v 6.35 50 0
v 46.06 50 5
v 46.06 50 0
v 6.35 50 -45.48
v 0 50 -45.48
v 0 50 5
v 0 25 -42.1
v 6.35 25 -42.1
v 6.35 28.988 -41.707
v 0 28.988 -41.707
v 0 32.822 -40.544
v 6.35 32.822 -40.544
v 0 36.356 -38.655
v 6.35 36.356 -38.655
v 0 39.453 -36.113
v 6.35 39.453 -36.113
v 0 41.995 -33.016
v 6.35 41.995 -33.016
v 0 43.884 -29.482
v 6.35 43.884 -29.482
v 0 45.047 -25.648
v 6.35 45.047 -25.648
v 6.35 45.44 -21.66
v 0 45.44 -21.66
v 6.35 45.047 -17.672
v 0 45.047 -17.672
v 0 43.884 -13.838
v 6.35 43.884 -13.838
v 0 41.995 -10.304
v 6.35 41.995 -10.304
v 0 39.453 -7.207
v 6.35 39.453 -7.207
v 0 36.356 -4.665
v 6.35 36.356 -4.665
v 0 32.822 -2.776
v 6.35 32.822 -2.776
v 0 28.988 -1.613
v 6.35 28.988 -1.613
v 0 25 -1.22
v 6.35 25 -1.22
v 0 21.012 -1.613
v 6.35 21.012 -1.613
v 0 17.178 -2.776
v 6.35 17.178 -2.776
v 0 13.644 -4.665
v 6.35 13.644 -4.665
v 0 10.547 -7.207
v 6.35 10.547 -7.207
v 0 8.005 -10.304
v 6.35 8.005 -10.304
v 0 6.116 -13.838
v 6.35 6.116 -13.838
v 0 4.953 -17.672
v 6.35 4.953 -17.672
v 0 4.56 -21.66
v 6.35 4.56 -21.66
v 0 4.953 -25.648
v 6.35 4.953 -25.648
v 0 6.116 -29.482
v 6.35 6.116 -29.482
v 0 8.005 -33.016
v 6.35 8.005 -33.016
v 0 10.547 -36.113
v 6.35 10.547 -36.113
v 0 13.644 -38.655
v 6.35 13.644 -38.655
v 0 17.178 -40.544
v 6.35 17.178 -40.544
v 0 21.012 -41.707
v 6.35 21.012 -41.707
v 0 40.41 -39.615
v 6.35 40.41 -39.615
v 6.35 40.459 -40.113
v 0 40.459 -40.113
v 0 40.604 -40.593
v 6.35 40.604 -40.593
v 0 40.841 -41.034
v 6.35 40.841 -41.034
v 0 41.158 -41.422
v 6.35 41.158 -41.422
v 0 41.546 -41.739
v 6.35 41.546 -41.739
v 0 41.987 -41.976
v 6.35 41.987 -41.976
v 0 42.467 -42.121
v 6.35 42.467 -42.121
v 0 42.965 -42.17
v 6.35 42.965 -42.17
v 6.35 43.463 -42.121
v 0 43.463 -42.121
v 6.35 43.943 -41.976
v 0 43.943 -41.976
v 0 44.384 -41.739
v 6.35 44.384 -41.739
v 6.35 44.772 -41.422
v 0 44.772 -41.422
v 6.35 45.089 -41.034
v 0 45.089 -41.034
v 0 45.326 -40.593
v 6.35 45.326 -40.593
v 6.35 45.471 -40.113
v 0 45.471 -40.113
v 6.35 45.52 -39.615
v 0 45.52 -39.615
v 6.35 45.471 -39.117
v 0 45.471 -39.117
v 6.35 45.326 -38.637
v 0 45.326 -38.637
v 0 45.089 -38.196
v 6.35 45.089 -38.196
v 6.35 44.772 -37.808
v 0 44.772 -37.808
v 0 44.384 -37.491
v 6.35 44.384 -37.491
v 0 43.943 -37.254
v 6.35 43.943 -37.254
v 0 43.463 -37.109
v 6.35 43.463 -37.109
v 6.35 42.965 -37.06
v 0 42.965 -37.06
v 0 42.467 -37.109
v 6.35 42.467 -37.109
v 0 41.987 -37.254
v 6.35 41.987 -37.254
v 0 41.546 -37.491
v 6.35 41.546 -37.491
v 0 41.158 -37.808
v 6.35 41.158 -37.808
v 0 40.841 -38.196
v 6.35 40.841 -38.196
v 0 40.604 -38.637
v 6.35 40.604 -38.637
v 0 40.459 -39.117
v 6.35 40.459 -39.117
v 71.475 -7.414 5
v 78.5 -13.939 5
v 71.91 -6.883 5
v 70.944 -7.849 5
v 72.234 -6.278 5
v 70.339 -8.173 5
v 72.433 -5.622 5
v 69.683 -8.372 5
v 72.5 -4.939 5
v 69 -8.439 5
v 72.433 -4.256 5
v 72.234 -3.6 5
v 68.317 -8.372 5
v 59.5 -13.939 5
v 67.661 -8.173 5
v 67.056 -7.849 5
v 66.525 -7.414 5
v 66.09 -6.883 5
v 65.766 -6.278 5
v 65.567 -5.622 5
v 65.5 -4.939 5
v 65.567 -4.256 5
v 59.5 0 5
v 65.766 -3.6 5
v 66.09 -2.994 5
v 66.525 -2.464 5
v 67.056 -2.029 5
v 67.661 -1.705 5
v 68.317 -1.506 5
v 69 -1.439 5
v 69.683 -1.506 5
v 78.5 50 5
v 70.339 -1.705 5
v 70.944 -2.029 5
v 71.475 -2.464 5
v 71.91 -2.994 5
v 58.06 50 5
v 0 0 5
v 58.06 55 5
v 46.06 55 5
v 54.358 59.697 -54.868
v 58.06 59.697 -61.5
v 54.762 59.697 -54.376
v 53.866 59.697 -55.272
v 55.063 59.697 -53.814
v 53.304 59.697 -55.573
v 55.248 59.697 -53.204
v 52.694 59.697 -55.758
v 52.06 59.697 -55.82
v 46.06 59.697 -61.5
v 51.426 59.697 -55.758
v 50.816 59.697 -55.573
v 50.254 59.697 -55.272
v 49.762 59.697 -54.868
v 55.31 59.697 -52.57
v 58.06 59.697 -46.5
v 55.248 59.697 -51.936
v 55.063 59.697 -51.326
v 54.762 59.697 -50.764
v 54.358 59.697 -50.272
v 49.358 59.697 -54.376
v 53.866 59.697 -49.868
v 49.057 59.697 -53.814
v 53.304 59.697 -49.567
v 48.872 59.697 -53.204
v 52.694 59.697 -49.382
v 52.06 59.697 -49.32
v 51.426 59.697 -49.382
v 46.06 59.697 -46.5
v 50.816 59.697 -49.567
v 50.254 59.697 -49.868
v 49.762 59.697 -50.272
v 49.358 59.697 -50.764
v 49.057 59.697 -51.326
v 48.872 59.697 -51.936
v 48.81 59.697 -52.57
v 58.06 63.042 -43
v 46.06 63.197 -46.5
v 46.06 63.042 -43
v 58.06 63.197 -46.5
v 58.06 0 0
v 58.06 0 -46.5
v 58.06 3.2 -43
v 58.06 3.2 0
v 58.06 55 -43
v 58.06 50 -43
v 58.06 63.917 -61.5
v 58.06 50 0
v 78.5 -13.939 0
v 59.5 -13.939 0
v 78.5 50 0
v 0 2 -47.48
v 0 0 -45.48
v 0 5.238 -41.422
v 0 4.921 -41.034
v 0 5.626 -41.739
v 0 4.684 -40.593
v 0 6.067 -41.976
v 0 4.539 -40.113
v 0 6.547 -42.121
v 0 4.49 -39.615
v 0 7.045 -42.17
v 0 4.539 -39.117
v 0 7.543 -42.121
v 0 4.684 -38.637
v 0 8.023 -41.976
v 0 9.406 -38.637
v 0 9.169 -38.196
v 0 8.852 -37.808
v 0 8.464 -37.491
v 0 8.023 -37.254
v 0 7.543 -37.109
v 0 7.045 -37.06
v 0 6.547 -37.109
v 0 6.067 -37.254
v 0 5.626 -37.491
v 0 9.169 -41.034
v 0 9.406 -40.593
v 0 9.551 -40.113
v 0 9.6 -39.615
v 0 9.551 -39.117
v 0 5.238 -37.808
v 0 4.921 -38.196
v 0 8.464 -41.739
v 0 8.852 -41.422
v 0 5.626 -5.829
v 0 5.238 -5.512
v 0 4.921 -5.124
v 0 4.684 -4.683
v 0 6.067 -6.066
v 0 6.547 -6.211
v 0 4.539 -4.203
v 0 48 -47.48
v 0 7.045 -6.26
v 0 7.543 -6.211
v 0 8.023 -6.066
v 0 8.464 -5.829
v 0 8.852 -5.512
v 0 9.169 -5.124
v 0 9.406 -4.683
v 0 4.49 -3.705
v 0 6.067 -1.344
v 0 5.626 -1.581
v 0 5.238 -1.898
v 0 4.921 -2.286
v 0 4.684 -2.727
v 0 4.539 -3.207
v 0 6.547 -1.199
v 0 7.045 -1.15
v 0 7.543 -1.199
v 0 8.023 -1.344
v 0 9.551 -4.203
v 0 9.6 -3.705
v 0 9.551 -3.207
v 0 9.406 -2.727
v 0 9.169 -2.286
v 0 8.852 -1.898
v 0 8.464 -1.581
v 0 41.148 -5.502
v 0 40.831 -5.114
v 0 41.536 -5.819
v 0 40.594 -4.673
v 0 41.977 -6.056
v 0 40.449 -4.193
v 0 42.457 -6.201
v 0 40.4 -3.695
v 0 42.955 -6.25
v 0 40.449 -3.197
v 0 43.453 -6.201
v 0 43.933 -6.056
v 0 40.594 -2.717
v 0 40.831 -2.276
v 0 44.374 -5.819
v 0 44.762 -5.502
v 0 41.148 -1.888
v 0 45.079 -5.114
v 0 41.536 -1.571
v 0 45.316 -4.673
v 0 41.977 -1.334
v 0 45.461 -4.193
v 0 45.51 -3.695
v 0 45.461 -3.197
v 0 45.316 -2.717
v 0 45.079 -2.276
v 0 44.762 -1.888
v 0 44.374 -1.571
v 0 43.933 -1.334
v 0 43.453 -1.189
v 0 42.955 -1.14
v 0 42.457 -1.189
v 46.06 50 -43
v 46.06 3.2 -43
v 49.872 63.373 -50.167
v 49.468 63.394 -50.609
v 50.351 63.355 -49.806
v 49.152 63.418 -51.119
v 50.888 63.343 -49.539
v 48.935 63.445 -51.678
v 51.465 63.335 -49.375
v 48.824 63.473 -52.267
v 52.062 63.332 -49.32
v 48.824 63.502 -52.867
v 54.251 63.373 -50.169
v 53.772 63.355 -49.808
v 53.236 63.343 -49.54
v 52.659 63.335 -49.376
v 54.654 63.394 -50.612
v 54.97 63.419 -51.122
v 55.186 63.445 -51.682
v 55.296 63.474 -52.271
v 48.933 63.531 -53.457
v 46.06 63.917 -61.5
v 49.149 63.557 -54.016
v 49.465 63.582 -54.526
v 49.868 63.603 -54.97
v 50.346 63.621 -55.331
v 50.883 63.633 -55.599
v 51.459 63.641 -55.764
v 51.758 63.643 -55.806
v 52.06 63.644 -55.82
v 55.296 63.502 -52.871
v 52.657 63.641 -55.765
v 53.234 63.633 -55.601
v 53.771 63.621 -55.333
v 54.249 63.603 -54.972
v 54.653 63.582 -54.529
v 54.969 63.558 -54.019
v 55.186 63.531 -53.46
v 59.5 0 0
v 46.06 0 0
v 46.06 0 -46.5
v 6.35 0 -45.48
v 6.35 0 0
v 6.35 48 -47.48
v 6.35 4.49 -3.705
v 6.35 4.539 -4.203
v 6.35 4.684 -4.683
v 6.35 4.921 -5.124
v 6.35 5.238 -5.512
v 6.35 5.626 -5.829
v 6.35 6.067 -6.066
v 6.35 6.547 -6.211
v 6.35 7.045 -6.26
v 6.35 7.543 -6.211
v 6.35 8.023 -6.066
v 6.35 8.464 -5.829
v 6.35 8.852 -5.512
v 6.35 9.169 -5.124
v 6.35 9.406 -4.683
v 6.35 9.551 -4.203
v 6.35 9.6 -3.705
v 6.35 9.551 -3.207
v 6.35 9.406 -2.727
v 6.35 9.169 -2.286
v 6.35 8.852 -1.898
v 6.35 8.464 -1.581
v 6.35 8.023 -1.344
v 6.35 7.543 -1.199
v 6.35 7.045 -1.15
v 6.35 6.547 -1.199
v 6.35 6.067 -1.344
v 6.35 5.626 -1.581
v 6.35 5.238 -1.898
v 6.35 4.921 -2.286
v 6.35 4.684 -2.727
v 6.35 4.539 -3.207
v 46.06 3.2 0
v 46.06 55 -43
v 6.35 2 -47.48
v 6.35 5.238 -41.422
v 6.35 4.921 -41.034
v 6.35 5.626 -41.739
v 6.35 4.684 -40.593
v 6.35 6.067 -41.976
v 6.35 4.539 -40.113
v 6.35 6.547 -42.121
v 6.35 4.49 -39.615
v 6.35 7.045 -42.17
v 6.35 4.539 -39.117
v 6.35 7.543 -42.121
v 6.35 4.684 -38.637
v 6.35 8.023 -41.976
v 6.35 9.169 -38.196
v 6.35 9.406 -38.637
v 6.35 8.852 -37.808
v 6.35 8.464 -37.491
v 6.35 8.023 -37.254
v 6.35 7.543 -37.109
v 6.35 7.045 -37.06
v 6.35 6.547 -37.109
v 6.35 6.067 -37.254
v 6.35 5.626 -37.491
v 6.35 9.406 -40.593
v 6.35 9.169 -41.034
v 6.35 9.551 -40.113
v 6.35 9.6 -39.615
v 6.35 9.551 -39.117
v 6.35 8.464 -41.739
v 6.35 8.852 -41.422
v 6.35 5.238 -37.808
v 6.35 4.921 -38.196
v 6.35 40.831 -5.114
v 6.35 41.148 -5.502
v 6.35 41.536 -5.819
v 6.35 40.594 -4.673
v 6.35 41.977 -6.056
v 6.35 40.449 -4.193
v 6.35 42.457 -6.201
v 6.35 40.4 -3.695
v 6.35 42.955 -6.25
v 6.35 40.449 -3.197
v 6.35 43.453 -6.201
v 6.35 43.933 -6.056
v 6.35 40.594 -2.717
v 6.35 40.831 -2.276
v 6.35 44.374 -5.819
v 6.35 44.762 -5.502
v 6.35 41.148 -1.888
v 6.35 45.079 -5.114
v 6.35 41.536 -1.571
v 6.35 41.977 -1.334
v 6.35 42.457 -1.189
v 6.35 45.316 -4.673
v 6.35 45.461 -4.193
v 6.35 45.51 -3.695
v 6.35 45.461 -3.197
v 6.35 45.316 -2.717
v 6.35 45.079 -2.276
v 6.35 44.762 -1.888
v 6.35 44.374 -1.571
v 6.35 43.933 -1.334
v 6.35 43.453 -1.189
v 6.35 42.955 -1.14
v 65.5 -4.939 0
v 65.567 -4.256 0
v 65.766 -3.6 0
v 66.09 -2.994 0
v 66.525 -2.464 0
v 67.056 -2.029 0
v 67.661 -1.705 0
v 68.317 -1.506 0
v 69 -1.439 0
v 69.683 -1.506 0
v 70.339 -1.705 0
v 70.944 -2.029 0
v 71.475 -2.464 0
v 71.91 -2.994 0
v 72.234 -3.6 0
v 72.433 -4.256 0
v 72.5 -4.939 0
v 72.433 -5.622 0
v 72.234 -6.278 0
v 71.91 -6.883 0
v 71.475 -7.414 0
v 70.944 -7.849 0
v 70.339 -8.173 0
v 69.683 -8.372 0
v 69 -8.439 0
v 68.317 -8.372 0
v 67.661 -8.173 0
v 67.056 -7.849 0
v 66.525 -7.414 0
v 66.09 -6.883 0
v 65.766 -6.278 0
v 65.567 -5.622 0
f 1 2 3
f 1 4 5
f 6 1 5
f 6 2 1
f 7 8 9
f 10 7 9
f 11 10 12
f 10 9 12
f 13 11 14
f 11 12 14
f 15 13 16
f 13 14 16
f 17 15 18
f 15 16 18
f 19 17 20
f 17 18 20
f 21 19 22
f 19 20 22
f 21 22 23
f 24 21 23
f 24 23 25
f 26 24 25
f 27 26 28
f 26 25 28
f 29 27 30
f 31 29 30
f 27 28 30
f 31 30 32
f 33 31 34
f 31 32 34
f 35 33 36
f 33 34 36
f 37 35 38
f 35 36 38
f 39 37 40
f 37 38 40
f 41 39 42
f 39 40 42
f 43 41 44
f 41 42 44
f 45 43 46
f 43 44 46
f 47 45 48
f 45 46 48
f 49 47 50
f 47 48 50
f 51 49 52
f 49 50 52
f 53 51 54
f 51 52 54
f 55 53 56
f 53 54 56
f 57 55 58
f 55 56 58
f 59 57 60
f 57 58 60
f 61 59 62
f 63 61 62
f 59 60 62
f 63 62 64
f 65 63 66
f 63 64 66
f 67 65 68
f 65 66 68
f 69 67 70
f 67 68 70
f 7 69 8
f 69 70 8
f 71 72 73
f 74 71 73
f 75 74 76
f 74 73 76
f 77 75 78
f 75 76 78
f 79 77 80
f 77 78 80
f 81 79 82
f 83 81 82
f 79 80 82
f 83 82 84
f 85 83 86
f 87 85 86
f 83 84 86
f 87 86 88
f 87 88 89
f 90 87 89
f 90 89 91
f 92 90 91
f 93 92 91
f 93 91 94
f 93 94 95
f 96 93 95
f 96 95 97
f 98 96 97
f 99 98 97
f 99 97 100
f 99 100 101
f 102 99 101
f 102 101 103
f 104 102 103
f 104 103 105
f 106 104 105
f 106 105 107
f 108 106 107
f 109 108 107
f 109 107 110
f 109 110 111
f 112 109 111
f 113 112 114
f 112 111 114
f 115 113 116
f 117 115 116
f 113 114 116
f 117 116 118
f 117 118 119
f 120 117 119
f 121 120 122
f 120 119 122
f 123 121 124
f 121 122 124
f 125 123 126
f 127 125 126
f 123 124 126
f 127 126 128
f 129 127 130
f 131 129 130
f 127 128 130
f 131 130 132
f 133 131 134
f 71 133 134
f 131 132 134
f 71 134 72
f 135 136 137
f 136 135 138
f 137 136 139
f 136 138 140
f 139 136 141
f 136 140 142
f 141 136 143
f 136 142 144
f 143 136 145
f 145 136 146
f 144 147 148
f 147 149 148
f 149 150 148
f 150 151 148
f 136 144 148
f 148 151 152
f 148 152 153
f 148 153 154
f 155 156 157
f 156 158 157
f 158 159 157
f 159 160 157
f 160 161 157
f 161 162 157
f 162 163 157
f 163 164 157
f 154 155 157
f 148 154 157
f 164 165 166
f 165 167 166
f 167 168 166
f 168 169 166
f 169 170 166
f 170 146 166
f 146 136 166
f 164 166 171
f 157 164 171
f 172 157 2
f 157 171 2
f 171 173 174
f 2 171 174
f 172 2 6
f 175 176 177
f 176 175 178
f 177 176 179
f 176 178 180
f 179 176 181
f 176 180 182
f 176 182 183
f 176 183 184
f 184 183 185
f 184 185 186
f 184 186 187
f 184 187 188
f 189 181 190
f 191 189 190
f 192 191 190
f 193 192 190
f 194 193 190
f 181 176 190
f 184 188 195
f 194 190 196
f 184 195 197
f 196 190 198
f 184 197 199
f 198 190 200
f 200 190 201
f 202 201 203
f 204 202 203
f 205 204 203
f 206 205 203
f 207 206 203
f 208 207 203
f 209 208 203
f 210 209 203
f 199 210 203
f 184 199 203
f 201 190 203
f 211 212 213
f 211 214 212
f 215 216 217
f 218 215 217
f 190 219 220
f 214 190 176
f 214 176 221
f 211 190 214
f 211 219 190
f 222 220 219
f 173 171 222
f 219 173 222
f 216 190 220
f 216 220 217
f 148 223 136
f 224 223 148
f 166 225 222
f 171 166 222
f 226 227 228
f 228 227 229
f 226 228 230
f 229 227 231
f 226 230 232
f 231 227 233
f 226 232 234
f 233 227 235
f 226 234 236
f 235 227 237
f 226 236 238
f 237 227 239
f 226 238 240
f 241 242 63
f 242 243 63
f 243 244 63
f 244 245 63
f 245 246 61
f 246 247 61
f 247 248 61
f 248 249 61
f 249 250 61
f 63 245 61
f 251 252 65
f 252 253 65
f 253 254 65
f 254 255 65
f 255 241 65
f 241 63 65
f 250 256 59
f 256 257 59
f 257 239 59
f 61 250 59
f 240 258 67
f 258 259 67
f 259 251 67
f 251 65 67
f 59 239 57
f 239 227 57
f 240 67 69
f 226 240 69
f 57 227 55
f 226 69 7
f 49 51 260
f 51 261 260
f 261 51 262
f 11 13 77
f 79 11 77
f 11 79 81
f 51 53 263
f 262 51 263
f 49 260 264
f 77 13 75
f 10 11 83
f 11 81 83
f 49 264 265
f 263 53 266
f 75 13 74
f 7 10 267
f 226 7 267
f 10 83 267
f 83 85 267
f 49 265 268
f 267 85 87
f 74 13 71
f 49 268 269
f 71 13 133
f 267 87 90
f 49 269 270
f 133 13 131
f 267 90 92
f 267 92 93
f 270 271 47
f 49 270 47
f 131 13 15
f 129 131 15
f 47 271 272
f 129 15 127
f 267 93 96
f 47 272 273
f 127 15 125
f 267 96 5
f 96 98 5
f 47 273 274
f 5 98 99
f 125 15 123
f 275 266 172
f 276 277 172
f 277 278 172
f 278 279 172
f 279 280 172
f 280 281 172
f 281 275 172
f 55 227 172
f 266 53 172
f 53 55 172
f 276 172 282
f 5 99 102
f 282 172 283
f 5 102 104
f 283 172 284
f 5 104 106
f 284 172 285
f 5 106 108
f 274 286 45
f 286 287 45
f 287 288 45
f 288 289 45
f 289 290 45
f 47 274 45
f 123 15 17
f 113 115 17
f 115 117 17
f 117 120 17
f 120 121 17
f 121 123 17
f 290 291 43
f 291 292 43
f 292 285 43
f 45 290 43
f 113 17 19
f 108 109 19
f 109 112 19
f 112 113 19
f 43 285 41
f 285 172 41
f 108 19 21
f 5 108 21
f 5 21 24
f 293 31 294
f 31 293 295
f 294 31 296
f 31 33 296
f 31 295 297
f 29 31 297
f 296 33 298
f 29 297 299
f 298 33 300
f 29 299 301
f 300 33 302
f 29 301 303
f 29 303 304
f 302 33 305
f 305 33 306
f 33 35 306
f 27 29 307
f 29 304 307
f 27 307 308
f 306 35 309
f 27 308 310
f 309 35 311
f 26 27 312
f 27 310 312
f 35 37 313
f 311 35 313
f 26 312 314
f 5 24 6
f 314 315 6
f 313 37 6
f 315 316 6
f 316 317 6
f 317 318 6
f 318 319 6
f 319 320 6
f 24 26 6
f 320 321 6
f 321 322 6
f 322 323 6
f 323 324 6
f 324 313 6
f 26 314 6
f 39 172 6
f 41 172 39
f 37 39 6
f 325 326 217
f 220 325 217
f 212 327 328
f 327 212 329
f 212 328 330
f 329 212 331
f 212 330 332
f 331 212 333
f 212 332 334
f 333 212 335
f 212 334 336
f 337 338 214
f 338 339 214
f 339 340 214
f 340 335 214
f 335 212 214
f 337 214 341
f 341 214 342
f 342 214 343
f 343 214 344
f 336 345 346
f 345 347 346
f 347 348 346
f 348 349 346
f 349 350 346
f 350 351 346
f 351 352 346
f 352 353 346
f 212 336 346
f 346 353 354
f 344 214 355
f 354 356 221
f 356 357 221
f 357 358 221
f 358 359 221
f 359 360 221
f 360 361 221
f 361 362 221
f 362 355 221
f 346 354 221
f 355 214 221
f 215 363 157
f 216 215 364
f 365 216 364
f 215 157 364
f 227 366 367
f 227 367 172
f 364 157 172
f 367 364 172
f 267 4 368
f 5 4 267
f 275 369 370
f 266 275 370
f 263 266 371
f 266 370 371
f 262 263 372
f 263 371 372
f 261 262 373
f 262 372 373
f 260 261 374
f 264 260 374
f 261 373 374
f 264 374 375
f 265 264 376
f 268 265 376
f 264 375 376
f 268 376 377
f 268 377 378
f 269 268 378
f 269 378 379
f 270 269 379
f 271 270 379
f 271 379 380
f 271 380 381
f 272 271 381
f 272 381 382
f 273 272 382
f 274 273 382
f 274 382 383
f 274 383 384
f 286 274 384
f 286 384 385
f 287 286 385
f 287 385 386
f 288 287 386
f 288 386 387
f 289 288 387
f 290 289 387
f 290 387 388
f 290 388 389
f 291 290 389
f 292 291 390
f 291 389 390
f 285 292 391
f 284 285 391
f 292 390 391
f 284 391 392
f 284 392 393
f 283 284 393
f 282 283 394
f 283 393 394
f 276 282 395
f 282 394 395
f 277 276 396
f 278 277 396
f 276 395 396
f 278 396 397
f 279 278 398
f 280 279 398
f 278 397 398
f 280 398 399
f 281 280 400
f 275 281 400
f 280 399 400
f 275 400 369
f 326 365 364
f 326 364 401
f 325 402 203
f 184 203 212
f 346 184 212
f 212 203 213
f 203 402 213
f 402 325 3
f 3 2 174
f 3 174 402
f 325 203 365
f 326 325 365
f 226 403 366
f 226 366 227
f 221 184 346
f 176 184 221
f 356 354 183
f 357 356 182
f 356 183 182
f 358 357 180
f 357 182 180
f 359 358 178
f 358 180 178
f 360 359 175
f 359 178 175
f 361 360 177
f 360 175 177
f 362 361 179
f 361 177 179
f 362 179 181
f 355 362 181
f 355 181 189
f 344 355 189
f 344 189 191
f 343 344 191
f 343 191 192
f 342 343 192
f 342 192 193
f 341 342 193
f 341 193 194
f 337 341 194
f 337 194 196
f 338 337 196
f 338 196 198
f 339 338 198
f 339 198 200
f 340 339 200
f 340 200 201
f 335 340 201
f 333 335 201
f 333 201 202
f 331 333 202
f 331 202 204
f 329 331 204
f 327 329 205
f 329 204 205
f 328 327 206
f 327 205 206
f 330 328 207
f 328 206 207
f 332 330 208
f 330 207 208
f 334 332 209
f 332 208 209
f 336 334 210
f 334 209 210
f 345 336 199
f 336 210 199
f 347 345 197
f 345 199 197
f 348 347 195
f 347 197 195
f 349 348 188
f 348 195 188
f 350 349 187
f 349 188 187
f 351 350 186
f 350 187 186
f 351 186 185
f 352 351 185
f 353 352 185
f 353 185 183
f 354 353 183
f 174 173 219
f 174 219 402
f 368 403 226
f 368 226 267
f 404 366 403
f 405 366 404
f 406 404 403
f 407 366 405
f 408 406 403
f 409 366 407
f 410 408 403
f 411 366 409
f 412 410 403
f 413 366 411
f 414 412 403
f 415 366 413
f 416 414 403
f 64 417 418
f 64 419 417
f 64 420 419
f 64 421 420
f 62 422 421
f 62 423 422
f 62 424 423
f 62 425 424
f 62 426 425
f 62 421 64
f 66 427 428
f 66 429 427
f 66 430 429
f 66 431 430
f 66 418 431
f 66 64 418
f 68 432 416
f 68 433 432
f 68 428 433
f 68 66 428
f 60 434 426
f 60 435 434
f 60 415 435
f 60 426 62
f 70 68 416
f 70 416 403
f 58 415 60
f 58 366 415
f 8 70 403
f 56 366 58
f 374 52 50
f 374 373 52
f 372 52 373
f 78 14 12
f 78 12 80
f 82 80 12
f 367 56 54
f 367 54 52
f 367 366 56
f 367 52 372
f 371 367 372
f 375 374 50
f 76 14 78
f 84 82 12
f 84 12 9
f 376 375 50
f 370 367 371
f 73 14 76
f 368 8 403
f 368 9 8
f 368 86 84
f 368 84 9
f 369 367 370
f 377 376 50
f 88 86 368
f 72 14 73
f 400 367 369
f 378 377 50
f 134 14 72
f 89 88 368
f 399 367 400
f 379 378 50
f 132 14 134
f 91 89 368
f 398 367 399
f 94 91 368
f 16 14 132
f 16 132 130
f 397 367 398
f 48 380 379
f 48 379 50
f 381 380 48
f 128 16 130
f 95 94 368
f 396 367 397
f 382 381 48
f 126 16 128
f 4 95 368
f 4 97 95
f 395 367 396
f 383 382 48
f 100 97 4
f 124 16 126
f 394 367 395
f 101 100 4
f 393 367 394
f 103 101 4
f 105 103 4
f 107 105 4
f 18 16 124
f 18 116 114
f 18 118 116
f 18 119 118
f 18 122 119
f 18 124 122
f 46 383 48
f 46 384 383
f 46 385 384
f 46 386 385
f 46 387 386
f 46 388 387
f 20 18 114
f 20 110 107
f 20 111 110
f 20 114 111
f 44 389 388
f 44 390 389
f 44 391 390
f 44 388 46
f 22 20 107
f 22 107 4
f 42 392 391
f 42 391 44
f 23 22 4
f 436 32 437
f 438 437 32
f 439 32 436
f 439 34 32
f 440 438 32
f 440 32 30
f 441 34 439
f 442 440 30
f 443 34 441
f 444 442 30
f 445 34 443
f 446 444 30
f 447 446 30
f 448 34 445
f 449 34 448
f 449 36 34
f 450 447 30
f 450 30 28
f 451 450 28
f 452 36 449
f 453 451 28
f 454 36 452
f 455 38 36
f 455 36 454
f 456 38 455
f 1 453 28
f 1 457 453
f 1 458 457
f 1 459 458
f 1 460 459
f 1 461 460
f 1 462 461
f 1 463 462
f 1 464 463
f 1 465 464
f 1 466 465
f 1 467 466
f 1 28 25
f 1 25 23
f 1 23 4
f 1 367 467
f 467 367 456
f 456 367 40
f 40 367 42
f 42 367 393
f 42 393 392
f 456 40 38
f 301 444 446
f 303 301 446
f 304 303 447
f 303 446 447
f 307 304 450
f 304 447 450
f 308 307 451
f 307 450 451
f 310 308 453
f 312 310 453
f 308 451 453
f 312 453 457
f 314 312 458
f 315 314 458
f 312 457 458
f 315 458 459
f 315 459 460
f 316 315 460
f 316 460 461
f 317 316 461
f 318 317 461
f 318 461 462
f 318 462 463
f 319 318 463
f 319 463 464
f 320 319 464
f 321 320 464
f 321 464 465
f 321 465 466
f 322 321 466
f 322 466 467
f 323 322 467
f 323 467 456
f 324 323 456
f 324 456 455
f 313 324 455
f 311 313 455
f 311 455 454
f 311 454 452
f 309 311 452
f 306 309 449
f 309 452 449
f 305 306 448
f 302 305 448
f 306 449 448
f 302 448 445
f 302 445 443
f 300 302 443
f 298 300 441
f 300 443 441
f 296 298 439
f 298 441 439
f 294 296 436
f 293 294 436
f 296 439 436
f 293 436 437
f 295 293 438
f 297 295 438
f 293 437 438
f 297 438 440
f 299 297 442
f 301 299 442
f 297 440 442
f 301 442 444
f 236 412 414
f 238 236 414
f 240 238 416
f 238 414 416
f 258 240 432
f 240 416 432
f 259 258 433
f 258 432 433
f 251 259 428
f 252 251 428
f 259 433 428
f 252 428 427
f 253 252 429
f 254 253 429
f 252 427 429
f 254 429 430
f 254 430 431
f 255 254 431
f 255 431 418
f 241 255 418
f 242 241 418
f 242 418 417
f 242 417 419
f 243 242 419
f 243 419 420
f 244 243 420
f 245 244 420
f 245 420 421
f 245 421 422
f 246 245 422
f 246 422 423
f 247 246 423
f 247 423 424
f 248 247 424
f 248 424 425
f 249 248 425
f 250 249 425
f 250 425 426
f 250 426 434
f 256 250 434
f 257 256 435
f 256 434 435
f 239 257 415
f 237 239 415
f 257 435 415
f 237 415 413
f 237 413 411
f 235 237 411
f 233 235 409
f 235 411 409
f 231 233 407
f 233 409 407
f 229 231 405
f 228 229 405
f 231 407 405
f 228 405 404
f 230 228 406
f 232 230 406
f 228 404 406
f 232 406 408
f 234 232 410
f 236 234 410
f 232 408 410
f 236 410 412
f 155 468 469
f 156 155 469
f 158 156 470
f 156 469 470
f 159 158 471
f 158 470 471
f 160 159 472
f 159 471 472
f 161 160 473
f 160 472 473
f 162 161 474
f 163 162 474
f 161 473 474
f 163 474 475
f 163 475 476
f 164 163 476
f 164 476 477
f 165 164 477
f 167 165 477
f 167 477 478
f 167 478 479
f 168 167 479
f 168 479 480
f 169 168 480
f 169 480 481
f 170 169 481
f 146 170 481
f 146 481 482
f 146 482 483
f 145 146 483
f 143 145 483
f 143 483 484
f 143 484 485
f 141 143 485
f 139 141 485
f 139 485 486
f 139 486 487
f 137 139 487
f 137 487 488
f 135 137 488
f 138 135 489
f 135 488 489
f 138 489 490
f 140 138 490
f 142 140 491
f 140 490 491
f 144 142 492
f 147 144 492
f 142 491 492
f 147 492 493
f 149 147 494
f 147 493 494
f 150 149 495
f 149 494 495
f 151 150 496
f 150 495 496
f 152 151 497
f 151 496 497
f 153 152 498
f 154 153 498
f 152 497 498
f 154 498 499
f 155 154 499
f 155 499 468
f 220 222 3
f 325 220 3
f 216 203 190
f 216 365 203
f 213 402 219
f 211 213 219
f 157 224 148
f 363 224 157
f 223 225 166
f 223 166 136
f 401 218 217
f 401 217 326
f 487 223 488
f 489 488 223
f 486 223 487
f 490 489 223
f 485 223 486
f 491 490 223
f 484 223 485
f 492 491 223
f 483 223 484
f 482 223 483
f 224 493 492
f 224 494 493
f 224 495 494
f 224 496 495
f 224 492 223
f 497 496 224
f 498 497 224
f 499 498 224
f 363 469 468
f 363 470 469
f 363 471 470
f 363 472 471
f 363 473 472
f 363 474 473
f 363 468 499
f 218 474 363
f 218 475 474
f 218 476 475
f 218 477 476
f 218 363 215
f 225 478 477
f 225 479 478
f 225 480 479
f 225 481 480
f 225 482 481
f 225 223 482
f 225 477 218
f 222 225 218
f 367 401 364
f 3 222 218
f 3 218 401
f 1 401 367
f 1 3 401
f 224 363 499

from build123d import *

# Parameters (mm, degrees)
BOSS_EXTRUDE1_DEPTH  = 5
SKETCH2_W            = 6.35
SKETCH2_H            = 50
BOSS_EXTRUDE2_DEPTH  = 52.48
CUT_EXTRUDE1_REACH   = 111.834
SKETCH3_R            = 20.44
SKETCH3_R_2          = 2.555
SKETCH3_W            = 5
SKETCH3_H            = 50
CUT_EXTRUDE2_REACH   = 113.895
SKETCH4_R            = 3.5
CUT_EXTRUDE6_REACH   = 113.895
SKETCH14_W           = 19
SKETCH14_H           = 15.316152196
SKETCH15_W           = 12
SKETCH15_H           = 3.2
BOSS_EXTRUDE7_DEPTH  = 46.5
BOSS_EXTRUDE8_REACH  = 107.356
SKETCH16_W           = 12
SKETCH16_H           = 3.5
SKETCH17_W           = 12
SKETCH17_H           = 3.5
BOSS_EXTRUDE9_DEPTH  = 15
CHAMFER2_SIZE        = 2
SKETCH22_W           = 12
SKETCH22_H           = 15
BOSS_EXTRUDE10_DEPTH = 0.72
CUT_EXTRUDE8_REACH   = 108.012
CUT_EXTRUDE7_REACH   = 125.963
SKETCH18_R           = 3.25
CIRPATTERN2_COUNT    = 2
CIRPATTERN2_ANGLE    = 90
BOSS_EXTRUDE11_REACH = 120.448
SKETCH24_W           = 12
SKETCH24_H           = 5


with BuildPart() as part:
    # Sketch1 → Boss-Extrude1 (new body)
    with BuildSketch(Plane.XY):
        Polygon((0, 0), (0, 50), (46.06, 50), (46.06, 55), (58.06, 55), (58.06, 50), (59.5, 50), (59.5, 64.061014889), (78.5, 64.061014889), (78.5, -13.938985111), (59.5, -13.938985111), (59.5, 0), align=None)
    extrude(amount=BOSS_EXTRUDE1_DEPTH)

    # Sketch2 → Boss-Extrude2 (add)
    with BuildSketch(Plane(origin=(0, 0, 0), x_dir=(-1, 0, 0), z_dir=(0, 0, -1))):
        with Locations((-3.175, 25)):
            Rectangle(SKETCH2_W, SKETCH2_H)
    extrude(amount=BOSS_EXTRUDE2_DEPTH)

    # Sketch3 → Cut-Extrude1 (cut, up to next)
    with BuildSketch(Plane(origin=(6.35, 0, 0), x_dir=(0, 0, -1), z_dir=(1, 0, 0)), mode=Mode.PRIVATE) as cut_extrude1_sk1:
        with Locations((21.66, 25)):
            Circle(SKETCH3_R)
    cut_extrude1_tool1 = extrude(cut_extrude1_sk1.sketch, amount=-CUT_EXTRUDE1_REACH, mode=Mode.PRIVATE) & part.part
    # Sketch3 → Cut-Extrude1 (cut, up to next)
    with BuildSketch(Plane(origin=(6.35, 0, 0), x_dir=(0, 0, -1), z_dir=(1, 0, 0)), mode=Mode.PRIVATE) as cut_extrude1_sk2:
        with Locations((3.695, 42.955)):
            Circle(SKETCH3_R_2)
    cut_extrude1_tool2 = extrude(cut_extrude1_sk2.sketch, amount=-CUT_EXTRUDE1_REACH, mode=Mode.PRIVATE) & part.part
    # Sketch3 → Cut-Extrude1 (cut, up to next)
    with BuildSketch(Plane(origin=(6.35, 0, 0), x_dir=(0, 0, -1), z_dir=(1, 0, 0)), mode=Mode.PRIVATE) as cut_extrude1_sk3:
        with Locations((39.615, 7.045)):
            Circle(SKETCH3_R_2)
    cut_extrude1_tool3 = extrude(cut_extrude1_sk3.sketch, amount=-CUT_EXTRUDE1_REACH, mode=Mode.PRIVATE) & part.part
    # Sketch3 → Cut-Extrude1 (cut, up to next)
    with BuildSketch(Plane(origin=(6.35, 0, 0), x_dir=(0, 0, -1), z_dir=(1, 0, 0)), mode=Mode.PRIVATE) as cut_extrude1_sk4:
        with Locations((49.98, 25)):
            Rectangle(SKETCH3_W, SKETCH3_H)
    cut_extrude1_tool4 = extrude(cut_extrude1_sk4.sketch, amount=-CUT_EXTRUDE1_REACH, mode=Mode.PRIVATE) & part.part
    cut_extrude1_1 = cut_extrude1_tool1.solids().sort_by_distance((6.35, 25, -21.66))[0]
    add(cut_extrude1_1, mode=Mode.SUBTRACT)
    cut_extrude1_2 = cut_extrude1_tool2.solids().sort_by_distance((6.35, 42.955, -3.695))[0]
    add(cut_extrude1_2, mode=Mode.SUBTRACT)
    cut_extrude1_3 = cut_extrude1_tool3.solids().sort_by_distance((6.35, 7.045, -39.615))[0]
    add(cut_extrude1_3, mode=Mode.SUBTRACT)
    cut_extrude1_4 = cut_extrude1_tool4.solids().sort_by_distance((6.35, 25, -49.98))[0]
    add(cut_extrude1_4, mode=Mode.SUBTRACT)
    cut_extrude1 = cut_extrude1_1 + cut_extrude1_2 + cut_extrude1_3 + cut_extrude1_4  # Cut-Extrude1 as one shape, for the pattern or mirror that repeats it

    # Sketch4 → Cut-Extrude2 (cut, up to next)
    with BuildSketch(Plane(origin=(0, 0, 0), x_dir=(-1, 0, 0), z_dir=(0, 0, -1)), mode=Mode.PRIVATE) as cut_extrude2_sk1:
        with Locations((-69, 55.061014889)):
            Circle(SKETCH4_R)
    cut_extrude2_tool1 = extrude(cut_extrude2_sk1.sketch, amount=-CUT_EXTRUDE2_REACH, mode=Mode.PRIVATE) & part.part
    # Sketch4 → Cut-Extrude2 (cut, up to next)
    with BuildSketch(Plane(origin=(0, 0, 0), x_dir=(-1, 0, 0), z_dir=(0, 0, -1)), mode=Mode.PRIVATE) as cut_extrude2_sk2:
        with Locations((-69, -4.938985111)):
            Circle(SKETCH4_R)
    cut_extrude2_tool2 = extrude(cut_extrude2_sk2.sketch, amount=-CUT_EXTRUDE2_REACH, mode=Mode.PRIVATE) & part.part
    add(cut_extrude2_tool1.solids().sort_by_distance((69, 55.061015, 0))[0], mode=Mode.SUBTRACT)
    add(cut_extrude2_tool2.solids().sort_by_distance((69, -4.938985, 0))[0], mode=Mode.SUBTRACT)

    # Sketch14 → Cut-Extrude6 (cut, up to next)
    with BuildSketch(Plane(origin=(0, 0, 0), x_dir=(-1, 0, 0), z_dir=(0, 0, -1)), mode=Mode.PRIVATE) as cut_extrude6_sk1:
        with Locations((-69, 57.658076098)):
            Rectangle(SKETCH14_W, SKETCH14_H)
    cut_extrude6_tool1 = extrude(cut_extrude6_sk1.sketch, amount=-CUT_EXTRUDE6_REACH, mode=Mode.PRIVATE) & part.part
    add(cut_extrude6_tool1.solids().sort_by_distance((69, 57.658076, 0))[0], mode=Mode.SUBTRACT)

    # Sketch15 → Boss-Extrude7 (add)
    with BuildSketch(Plane(origin=(0, 0, 0), x_dir=(-1, 0, 0), z_dir=(0, 0, -1))):
        with Locations((-52.06, 1.6)):
            Rectangle(SKETCH15_W, SKETCH15_H)
    extrude(amount=BOSS_EXTRUDE7_DEPTH)

    # Boss-Extrude8: up to this plane
    boss_extrude8_end = Plane(origin=(166.832994776, 64.085435133, -66.619565524), z_dir=(-1.1416993347548052e-15, 0.9990256874715413, 0.04413247978546202))
    # Sketch16 → Boss-Extrude8 (add, up to the surface)
    with BuildSketch(Plane(origin=(0, 3.2, 0), x_dir=(1, 0, 0), z_dir=(0, 1, 0)), mode=Mode.PRIVATE) as boss_extrude8_sk1:
        with Locations((52.06, 44.75)):
            Rectangle(SKETCH16_W, SKETCH16_H)
    boss_extrude8_tool1 = split(extrude(boss_extrude8_sk1.sketch, amount=BOSS_EXTRUDE8_REACH, mode=Mode.PRIVATE), bisect_by=boss_extrude8_end, keep=Keep.BOTH, mode=Mode.PRIVATE)
    add(boss_extrude8_tool1.solids().sort_by_distance((52.06, 3.2, -44.75))[0])

    # Sketch17 → Boss-Extrude9 (add)
    with BuildSketch(Plane(origin=(0, 0, -46.5), x_dir=(-1, 0, 0), z_dir=(0, 0, -1))):
        with Locations((-52.06, 61.446642853)):
            Rectangle(SKETCH17_W, SKETCH17_H)
    extrude(amount=BOSS_EXTRUDE9_DEPTH)

    # Chamfer2
    chamfer2_edges = [part.edges().sort_by_distance(p)[0] for p in [
        (3.175, 0, -47.48),
        (3.175, 50, -47.48),
    ]]
    chamfer(chamfer2_edges, length=CHAMFER2_SIZE)

    # Sketch22 → Boss-Extrude10 (add)
    with BuildSketch(Plane(origin=(0, 63.196642853, 0), x_dir=(1, 0, 0), z_dir=(0, 1, 0))):
        with Locations((52.06, 54)):
            Rectangle(SKETCH22_W, SKETCH22_H)
    extrude(amount=BOSS_EXTRUDE10_DEPTH)

    # Sketch23 → Cut-Extrude8 (cut, up to next)
    with BuildSketch(Plane(origin=(58.06, 0, 0), x_dir=(0, 0, -1), z_dir=(1, 0, 0)), mode=Mode.PRIVATE) as cut_extrude8_sk1:
        Polygon((46.5, 63.916642853), (46.5, 63.196642853), (61.5, 63.916642853), align=None)
    cut_extrude8_tool1 = extrude(cut_extrude8_sk1.sketch, amount=-CUT_EXTRUDE8_REACH, mode=Mode.PRIVATE) & part.part
    add(cut_extrude8_tool1.solids().sort_by_distance((58.06, 63.676643, -51.5))[0], mode=Mode.SUBTRACT)

    # Cut-Extrude7: up to this plane
    cut_extrude7_end = Plane(origin=(-0.001, 63.196642853, -46.5), z_dir=(-2.1659106514416256e-15, -0.9988499868416298, -0.04794479936839813))
    # Sketch18 → Cut-Extrude7 (cut, up to the surface)
    with BuildSketch(Plane.XZ.offset(-59.696642853), mode=Mode.PRIVATE) as cut_extrude7_sk1:
        with Locations(Location((52.06, -52.57, 0), (0, 0, 270))):
            Circle(SKETCH18_R)
    cut_extrude7_tool1 = split(extrude(cut_extrude7_sk1.sketch, amount=-CUT_EXTRUDE7_REACH, mode=Mode.PRIVATE), bisect_by=cut_extrude7_end, keep=Keep.BOTH, mode=Mode.PRIVATE)
    add(cut_extrude7_tool1.solids().sort_by_distance((52.06, 59.696643, -52.57))[0], mode=Mode.SUBTRACT)

    # CirPattern2: Cut-Extrude1 ×2 about axis
    cirpattern2_axis = Axis((0, 25, -21.66), (-1, 0, 0))
    for i in range(1, CIRPATTERN2_COUNT):
        add(cut_extrude1.rotate(cirpattern2_axis, i * CIRPATTERN2_ANGLE / (CIRPATTERN2_COUNT - 1)), mode=Mode.SUBTRACT)

    # Sketch24 → Boss-Extrude11 (add, up to next)
    with BuildSketch(Plane(origin=(0, 0, 0), x_dir=(-1, 0, 0), z_dir=(0, 0, -1)), mode=Mode.PRIVATE) as boss_extrude11_sk1:
        with Locations((-52.06, 52.5)):
            Rectangle(SKETCH24_W, SKETCH24_H)
    boss_extrude11_tool1 = extrude(boss_extrude11_sk1.sketch, amount=BOSS_EXTRUDE11_REACH, mode=Mode.PRIVATE) - part.part
    add(boss_extrude11_tool1.solids().sort_by_distance((52.06, 52.5, 0))[0])


solid = part.part
